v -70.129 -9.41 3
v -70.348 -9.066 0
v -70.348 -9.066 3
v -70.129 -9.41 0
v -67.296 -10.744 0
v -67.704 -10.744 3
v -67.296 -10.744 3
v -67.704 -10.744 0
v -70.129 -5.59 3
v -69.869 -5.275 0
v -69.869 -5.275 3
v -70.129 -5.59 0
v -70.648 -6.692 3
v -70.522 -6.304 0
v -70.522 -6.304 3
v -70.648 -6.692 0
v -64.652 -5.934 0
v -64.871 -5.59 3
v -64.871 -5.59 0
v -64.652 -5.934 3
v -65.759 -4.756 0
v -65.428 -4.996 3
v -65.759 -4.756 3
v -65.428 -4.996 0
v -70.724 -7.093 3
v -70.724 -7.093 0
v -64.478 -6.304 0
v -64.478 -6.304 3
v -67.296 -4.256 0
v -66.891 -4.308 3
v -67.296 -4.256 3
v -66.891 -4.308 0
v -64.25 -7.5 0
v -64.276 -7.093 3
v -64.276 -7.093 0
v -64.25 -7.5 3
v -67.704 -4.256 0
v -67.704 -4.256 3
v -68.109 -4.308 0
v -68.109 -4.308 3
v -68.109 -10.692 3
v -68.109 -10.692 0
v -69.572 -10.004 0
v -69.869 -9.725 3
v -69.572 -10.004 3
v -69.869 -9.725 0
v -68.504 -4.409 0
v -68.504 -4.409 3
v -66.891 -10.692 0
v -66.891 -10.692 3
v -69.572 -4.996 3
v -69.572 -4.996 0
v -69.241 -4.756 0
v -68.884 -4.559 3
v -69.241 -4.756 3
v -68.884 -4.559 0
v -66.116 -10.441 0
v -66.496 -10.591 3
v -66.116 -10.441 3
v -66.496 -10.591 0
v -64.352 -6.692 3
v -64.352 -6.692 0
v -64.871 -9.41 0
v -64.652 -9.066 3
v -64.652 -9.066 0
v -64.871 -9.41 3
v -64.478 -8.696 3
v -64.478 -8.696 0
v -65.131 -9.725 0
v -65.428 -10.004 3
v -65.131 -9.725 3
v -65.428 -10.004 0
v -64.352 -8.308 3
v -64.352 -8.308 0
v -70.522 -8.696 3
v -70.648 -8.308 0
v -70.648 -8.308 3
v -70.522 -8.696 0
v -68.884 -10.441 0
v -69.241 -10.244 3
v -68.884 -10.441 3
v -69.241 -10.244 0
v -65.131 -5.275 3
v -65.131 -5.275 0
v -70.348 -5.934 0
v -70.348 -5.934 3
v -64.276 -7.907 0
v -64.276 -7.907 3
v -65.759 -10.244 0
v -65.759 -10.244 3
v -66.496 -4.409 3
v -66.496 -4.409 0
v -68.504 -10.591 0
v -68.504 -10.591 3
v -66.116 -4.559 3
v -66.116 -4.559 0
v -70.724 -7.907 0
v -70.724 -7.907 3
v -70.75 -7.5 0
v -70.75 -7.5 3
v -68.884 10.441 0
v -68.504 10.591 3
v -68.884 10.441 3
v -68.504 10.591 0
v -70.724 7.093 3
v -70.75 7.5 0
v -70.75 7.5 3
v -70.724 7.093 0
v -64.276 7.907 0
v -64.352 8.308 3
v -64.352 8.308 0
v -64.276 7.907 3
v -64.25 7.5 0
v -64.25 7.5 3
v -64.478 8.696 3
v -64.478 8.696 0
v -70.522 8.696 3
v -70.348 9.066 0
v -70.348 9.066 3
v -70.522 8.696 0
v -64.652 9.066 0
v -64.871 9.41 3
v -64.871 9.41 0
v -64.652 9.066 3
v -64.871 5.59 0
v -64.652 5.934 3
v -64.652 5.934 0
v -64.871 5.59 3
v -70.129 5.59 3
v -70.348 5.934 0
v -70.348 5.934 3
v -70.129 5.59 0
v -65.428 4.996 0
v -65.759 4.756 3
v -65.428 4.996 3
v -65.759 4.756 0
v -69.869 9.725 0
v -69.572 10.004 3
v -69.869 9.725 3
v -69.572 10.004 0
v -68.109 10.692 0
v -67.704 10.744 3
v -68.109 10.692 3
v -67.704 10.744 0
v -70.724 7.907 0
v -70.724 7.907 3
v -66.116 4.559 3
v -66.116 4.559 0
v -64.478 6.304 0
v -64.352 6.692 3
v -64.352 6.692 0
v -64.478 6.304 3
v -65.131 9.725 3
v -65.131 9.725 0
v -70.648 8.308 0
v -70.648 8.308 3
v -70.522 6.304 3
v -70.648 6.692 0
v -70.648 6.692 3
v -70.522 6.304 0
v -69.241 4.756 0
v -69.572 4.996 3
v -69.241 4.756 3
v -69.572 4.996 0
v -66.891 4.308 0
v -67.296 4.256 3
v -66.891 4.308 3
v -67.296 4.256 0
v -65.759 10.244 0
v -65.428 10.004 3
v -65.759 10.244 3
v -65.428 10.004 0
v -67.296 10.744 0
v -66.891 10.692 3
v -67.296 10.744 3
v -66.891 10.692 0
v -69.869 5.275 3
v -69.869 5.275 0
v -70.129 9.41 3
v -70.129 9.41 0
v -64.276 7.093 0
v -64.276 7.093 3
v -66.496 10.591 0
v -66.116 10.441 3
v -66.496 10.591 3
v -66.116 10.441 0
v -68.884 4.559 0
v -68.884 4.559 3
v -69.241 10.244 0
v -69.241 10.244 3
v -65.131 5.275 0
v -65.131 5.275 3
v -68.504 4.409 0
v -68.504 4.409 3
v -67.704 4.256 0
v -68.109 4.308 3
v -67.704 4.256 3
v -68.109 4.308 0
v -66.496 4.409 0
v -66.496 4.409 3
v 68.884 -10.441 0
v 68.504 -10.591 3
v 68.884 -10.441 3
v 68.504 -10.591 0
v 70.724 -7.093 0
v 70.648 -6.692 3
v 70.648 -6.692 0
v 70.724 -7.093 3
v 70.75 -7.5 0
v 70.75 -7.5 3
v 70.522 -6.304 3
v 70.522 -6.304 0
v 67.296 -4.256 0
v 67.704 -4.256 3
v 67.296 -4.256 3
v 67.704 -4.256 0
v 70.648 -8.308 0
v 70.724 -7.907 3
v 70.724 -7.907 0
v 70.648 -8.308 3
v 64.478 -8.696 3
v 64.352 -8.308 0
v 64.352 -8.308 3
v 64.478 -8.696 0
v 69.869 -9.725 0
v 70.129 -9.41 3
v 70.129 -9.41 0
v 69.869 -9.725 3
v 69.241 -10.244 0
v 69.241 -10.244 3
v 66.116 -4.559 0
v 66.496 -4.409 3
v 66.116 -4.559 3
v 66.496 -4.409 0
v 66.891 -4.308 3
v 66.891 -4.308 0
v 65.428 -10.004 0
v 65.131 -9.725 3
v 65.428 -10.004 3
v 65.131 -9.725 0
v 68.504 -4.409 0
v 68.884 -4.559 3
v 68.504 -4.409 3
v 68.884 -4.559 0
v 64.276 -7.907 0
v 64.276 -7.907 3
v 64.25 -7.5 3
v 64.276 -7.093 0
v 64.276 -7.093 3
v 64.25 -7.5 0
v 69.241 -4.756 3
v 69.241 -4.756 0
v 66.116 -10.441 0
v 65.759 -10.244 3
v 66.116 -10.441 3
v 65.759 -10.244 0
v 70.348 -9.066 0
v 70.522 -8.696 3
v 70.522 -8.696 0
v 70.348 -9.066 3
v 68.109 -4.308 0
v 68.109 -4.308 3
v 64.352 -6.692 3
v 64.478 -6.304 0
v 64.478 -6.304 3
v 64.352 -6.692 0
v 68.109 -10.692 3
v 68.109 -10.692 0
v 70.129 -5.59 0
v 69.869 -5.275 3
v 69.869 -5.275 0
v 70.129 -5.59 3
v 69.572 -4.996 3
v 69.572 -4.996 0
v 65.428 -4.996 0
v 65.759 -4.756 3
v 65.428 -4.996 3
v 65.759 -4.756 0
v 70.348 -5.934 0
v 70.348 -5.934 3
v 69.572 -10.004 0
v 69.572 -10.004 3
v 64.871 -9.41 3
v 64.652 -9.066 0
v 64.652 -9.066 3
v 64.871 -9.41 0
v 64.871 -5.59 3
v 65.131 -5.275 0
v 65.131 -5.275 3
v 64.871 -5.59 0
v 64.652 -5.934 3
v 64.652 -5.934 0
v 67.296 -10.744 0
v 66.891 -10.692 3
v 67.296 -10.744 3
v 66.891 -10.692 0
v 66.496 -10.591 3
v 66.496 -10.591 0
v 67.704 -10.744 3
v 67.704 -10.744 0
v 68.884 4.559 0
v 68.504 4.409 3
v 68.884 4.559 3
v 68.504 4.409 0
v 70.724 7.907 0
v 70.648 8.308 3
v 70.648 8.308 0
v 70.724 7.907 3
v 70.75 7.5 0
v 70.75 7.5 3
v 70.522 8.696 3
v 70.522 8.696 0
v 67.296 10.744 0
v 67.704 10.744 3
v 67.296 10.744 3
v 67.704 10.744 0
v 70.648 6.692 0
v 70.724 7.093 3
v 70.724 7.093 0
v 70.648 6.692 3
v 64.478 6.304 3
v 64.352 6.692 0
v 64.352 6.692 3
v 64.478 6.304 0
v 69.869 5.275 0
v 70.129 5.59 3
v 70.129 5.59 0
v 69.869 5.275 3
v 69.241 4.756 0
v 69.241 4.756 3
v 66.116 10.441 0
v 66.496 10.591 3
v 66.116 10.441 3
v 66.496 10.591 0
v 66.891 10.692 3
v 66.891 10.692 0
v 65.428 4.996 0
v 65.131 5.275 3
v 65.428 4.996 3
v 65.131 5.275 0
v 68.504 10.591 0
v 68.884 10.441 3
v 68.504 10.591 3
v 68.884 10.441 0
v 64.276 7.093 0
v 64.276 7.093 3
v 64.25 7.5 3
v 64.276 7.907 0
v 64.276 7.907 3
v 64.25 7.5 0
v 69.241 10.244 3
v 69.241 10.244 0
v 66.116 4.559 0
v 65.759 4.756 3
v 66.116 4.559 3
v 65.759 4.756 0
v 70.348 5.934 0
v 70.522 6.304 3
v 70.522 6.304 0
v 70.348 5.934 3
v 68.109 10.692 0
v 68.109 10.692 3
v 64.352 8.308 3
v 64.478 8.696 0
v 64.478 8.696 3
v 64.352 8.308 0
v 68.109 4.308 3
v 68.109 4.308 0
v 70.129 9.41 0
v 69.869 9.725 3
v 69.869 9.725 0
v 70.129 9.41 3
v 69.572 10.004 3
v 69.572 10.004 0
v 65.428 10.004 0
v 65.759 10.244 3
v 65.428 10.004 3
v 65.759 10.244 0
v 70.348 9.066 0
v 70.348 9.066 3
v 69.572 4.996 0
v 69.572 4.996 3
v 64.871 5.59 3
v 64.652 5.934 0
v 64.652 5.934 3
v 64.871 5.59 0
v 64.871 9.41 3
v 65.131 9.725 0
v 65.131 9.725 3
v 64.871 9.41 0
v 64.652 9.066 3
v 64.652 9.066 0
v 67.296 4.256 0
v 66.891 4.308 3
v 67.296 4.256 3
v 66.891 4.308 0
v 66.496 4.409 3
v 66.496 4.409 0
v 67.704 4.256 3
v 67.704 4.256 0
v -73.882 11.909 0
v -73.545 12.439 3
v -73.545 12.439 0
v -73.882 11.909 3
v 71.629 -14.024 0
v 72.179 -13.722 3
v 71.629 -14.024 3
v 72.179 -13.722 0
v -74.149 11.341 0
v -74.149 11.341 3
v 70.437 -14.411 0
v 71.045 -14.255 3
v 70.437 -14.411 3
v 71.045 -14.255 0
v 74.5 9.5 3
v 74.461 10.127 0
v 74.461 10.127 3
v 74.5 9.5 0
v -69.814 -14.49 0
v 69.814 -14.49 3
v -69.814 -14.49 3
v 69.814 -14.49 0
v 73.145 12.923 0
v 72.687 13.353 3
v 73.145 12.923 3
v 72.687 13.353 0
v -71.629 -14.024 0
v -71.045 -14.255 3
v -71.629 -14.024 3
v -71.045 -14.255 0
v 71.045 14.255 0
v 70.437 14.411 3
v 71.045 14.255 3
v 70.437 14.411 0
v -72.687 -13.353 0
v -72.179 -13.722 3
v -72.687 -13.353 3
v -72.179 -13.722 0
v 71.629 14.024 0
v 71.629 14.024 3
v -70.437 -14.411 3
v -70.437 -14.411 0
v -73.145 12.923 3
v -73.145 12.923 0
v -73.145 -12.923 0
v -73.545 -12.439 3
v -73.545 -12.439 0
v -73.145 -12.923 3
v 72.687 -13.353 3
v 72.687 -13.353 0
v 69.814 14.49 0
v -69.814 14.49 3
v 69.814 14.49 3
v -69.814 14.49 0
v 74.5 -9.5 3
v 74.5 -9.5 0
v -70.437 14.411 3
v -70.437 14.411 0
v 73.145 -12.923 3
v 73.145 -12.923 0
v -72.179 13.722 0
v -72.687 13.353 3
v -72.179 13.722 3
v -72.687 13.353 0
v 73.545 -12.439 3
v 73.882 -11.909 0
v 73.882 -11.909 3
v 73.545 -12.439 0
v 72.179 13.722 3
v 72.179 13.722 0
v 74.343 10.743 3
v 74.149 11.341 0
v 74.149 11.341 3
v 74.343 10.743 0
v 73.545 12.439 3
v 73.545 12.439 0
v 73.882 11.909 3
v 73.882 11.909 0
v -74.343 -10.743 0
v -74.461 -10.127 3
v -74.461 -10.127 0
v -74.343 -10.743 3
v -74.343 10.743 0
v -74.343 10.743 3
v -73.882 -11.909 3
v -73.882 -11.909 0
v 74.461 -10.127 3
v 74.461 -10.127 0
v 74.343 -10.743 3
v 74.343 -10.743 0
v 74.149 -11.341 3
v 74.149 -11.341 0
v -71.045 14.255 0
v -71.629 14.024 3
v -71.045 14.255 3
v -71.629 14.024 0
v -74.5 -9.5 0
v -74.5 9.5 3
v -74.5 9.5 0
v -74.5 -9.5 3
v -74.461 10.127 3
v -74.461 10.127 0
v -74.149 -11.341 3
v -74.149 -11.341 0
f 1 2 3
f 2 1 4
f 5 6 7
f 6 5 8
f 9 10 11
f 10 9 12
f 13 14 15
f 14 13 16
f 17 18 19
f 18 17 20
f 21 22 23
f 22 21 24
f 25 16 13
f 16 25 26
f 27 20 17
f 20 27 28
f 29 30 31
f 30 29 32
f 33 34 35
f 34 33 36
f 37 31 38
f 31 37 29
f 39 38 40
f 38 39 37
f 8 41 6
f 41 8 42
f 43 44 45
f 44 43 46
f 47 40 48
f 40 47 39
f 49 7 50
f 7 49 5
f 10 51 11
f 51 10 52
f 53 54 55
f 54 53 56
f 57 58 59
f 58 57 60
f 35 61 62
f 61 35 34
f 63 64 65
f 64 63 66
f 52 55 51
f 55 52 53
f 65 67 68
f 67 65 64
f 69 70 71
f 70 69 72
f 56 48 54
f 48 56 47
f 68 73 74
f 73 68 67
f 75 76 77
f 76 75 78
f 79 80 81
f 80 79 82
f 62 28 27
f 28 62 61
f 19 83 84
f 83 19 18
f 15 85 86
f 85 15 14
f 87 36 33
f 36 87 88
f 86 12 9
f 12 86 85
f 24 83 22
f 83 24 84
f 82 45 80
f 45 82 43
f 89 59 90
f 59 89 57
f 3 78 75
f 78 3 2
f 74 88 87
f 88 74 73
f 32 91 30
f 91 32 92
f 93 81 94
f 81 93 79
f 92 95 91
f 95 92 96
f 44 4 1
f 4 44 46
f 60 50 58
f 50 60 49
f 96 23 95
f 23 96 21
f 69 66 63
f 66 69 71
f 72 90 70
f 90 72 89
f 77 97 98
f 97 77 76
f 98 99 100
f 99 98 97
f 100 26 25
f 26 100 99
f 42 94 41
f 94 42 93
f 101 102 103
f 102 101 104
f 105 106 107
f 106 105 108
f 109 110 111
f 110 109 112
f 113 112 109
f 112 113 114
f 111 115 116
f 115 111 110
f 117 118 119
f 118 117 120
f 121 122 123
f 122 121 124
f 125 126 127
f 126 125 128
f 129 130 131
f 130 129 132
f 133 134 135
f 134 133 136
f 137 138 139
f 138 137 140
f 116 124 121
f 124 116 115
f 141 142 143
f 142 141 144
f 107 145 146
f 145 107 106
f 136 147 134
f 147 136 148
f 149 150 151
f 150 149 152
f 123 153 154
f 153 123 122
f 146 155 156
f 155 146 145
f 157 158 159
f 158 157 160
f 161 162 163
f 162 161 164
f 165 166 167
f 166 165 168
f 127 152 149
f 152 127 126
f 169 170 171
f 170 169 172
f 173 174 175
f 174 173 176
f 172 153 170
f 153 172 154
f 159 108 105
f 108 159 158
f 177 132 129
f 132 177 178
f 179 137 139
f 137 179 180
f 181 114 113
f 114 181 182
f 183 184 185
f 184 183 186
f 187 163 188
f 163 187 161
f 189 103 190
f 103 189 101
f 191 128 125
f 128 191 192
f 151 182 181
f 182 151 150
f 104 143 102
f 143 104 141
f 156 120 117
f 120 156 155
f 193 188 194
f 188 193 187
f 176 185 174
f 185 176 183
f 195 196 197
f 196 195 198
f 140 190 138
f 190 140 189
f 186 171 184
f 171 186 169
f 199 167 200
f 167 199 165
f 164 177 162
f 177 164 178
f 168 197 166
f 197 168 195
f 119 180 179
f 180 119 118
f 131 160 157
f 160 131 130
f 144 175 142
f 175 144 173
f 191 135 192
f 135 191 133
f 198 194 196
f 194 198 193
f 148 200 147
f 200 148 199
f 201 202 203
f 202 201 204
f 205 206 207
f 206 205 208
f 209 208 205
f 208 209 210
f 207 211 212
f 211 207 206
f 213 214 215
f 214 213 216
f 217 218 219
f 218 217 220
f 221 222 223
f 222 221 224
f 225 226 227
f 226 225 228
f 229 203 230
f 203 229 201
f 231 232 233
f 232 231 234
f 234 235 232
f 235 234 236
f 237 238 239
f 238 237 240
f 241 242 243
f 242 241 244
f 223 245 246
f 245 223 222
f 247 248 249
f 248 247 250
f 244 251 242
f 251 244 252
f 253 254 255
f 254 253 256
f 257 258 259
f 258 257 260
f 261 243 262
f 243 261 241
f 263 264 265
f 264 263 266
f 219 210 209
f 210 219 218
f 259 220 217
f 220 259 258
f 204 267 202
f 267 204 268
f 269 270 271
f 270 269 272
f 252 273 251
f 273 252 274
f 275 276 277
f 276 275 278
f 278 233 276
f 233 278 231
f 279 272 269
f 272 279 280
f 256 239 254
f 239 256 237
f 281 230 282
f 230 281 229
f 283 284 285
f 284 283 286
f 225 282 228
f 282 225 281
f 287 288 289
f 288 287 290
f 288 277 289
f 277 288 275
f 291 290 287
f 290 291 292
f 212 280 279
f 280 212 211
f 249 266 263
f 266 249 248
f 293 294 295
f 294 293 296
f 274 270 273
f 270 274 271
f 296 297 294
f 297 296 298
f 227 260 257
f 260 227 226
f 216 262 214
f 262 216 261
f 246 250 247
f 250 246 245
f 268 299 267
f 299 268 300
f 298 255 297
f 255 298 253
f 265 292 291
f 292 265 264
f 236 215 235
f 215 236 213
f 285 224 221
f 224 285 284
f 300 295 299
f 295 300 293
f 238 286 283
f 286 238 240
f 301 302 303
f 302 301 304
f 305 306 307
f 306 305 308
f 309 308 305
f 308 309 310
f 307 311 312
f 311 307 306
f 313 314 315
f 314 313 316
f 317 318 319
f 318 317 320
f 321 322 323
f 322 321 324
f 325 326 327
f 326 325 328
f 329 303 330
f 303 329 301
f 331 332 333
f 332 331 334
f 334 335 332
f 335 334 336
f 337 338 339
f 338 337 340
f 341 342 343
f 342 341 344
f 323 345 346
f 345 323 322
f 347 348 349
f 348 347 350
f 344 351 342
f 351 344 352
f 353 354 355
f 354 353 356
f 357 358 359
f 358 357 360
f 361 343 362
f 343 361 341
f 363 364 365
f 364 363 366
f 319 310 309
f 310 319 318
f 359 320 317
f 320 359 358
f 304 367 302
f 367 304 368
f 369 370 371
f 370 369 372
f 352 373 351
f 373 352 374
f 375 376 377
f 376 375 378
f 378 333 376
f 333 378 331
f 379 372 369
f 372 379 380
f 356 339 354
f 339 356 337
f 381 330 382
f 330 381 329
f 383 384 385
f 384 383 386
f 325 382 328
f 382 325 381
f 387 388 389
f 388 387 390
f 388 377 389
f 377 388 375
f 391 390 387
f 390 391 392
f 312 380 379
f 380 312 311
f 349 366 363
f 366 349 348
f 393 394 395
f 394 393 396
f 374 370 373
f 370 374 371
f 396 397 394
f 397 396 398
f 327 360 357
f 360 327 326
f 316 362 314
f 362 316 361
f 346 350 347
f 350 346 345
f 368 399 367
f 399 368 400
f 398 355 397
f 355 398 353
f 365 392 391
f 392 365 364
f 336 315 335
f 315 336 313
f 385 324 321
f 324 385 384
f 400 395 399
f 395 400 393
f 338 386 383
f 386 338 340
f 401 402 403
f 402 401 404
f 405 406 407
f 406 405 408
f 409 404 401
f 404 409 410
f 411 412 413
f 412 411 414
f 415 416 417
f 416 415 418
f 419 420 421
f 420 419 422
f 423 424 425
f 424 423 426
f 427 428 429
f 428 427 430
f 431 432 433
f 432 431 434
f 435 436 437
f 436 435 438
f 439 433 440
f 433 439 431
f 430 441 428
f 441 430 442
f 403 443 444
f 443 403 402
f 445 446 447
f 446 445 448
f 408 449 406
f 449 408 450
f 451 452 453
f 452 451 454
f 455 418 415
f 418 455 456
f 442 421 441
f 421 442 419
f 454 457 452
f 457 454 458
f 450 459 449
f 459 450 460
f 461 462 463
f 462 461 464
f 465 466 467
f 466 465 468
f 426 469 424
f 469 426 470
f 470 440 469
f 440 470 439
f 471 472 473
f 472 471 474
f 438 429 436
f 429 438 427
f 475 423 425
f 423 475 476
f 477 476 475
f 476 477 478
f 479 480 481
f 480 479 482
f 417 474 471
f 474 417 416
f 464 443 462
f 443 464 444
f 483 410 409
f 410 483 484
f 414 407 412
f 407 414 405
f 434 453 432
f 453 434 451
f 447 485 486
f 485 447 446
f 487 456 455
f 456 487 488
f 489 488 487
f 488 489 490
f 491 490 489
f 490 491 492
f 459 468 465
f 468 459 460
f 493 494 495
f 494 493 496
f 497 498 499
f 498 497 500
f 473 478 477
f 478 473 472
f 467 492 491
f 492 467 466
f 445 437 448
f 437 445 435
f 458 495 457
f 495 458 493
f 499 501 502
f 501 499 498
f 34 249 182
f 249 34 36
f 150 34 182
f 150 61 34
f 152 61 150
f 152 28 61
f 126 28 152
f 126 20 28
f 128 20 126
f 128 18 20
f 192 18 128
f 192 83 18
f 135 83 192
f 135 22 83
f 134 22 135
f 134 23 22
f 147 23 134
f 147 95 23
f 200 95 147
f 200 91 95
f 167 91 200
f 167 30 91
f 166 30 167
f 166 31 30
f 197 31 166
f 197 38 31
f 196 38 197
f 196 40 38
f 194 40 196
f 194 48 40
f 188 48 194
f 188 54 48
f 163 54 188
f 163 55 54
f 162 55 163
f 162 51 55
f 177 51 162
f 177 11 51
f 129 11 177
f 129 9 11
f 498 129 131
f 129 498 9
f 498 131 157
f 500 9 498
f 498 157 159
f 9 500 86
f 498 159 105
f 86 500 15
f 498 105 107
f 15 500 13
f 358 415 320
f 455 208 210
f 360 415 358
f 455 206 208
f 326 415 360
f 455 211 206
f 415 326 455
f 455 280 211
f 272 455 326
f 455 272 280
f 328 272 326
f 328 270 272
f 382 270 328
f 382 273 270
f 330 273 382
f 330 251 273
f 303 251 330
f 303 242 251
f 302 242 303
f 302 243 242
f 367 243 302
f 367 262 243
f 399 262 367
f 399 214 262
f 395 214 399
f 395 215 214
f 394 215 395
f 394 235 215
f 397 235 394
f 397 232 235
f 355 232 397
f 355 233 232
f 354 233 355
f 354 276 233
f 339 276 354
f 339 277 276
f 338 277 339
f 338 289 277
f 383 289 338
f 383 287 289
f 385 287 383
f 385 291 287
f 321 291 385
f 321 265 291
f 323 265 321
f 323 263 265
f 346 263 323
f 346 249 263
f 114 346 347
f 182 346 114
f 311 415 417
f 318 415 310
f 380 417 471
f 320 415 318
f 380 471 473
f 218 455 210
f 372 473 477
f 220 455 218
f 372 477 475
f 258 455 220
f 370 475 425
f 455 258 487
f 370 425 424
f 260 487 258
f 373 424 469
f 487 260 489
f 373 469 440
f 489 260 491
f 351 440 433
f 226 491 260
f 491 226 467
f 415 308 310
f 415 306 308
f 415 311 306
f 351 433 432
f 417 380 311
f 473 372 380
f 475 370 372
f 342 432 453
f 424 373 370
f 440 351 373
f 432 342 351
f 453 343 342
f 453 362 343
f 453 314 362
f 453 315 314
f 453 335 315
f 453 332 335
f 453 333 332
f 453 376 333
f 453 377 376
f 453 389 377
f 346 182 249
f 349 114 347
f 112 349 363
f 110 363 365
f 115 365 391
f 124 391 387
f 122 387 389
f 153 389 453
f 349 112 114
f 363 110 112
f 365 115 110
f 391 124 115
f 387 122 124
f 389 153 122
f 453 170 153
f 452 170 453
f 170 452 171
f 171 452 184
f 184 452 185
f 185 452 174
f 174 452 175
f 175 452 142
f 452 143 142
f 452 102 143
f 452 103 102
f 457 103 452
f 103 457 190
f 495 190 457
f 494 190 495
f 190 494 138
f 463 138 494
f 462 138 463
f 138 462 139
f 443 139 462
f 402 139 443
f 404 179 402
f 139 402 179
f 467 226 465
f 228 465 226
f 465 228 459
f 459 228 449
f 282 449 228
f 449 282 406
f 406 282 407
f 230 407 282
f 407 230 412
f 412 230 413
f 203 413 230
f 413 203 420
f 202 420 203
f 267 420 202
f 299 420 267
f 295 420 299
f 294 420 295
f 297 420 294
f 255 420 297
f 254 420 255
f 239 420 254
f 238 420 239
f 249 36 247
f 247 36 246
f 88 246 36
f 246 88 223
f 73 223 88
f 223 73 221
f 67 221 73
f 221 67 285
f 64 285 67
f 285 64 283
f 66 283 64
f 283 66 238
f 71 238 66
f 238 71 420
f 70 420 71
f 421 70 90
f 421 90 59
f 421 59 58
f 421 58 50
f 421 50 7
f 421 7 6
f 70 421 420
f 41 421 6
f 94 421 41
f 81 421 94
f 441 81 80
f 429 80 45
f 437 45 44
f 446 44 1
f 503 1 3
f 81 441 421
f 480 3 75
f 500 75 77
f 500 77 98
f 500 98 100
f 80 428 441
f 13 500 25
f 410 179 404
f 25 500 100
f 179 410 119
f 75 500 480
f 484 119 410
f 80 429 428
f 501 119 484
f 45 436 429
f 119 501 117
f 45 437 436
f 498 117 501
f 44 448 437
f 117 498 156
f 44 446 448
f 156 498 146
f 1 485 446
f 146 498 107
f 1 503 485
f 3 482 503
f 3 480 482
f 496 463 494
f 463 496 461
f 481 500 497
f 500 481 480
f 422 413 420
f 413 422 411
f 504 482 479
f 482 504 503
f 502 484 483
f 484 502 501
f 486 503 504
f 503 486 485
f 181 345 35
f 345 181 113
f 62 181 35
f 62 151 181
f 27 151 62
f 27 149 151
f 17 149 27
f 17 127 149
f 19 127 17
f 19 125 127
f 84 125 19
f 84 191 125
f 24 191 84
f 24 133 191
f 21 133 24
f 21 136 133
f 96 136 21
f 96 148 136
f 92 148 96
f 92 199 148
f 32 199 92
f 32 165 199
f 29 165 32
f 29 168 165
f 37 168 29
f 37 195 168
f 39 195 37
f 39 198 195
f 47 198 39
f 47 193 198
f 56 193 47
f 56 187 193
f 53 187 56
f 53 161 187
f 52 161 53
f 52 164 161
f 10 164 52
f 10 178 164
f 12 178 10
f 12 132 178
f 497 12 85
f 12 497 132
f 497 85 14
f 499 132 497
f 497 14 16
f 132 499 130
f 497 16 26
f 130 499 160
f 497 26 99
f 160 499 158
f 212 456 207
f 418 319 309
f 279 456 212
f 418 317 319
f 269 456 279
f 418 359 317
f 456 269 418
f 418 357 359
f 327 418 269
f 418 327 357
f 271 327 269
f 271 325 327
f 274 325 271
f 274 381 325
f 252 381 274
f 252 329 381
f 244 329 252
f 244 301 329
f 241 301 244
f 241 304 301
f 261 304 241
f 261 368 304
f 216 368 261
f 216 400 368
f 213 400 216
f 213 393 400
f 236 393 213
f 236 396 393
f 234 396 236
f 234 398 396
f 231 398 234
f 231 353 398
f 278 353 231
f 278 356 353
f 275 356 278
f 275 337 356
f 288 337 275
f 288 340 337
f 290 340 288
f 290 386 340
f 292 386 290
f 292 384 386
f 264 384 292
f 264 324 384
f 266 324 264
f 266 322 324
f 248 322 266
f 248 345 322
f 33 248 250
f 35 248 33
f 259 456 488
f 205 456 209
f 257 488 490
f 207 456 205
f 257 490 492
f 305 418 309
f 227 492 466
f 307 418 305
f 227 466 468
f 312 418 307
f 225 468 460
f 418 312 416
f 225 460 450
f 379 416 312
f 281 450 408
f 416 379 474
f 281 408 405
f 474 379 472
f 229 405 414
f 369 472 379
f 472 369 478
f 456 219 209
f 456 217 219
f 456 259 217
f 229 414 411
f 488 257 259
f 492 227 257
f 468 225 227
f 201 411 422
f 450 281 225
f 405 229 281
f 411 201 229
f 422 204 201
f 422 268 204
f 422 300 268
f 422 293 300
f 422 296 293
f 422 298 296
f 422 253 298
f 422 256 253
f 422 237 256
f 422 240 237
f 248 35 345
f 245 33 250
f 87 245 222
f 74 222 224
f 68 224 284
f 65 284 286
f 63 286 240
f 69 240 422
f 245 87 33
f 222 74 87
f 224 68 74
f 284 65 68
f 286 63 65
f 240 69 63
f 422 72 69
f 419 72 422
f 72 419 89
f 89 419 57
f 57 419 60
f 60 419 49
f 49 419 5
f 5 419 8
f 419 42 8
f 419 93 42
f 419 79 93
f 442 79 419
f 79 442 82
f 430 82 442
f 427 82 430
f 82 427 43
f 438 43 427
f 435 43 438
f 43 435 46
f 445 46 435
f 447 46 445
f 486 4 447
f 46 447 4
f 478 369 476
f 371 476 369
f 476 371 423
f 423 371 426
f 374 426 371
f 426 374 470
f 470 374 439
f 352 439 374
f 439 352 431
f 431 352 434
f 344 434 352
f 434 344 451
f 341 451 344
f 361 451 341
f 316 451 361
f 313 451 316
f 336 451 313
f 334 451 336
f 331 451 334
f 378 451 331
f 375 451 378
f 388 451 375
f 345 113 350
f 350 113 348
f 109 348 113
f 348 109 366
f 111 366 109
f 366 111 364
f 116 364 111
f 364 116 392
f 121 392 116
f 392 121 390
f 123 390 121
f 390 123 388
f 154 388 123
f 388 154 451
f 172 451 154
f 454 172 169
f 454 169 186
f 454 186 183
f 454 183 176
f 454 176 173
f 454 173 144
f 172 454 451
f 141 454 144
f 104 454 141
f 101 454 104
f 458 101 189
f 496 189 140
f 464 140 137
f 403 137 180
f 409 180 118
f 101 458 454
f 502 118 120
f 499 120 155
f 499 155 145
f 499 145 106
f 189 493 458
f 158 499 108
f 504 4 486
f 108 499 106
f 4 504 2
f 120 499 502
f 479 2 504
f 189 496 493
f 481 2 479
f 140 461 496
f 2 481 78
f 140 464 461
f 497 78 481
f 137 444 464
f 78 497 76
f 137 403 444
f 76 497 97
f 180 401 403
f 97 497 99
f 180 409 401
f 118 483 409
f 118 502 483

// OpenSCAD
$fn = 50;


difference() {
	union() {
		hull() {
			translate(v = [-69.5000000000, 9.5000000000, 0]) {
				cylinder(h = 3, r = 5);
			}
			translate(v = [69.5000000000, 9.5000000000, 0]) {
				cylinder(h = 3, r = 5);
			}
			translate(v = [-69.5000000000, -9.5000000000, 0]) {
				cylinder(h = 3, r = 5);
			}
			translate(v = [69.5000000000, -9.5000000000, 0]) {
				cylinder(h = 3, r = 5);
			}
		}
	}
	union() {
		translate(v = [-67.5000000000, -7.5000000000, -100.0000000000]) {
			cylinder(h = 200, r = 3.2500000000);
		}
		translate(v = [-67.5000000000, 7.5000000000, -100.0000000000]) {
			cylinder(h = 200, r = 3.2500000000);
		}
		translate(v = [67.5000000000, -7.5000000000, -100.0000000000]) {
			cylinder(h = 200, r = 3.2500000000);
		}
		translate(v = [67.5000000000, 7.5000000000, -100.0000000000]) {
			cylinder(h = 200, r = 3.2500000000);
		}
	}
}
